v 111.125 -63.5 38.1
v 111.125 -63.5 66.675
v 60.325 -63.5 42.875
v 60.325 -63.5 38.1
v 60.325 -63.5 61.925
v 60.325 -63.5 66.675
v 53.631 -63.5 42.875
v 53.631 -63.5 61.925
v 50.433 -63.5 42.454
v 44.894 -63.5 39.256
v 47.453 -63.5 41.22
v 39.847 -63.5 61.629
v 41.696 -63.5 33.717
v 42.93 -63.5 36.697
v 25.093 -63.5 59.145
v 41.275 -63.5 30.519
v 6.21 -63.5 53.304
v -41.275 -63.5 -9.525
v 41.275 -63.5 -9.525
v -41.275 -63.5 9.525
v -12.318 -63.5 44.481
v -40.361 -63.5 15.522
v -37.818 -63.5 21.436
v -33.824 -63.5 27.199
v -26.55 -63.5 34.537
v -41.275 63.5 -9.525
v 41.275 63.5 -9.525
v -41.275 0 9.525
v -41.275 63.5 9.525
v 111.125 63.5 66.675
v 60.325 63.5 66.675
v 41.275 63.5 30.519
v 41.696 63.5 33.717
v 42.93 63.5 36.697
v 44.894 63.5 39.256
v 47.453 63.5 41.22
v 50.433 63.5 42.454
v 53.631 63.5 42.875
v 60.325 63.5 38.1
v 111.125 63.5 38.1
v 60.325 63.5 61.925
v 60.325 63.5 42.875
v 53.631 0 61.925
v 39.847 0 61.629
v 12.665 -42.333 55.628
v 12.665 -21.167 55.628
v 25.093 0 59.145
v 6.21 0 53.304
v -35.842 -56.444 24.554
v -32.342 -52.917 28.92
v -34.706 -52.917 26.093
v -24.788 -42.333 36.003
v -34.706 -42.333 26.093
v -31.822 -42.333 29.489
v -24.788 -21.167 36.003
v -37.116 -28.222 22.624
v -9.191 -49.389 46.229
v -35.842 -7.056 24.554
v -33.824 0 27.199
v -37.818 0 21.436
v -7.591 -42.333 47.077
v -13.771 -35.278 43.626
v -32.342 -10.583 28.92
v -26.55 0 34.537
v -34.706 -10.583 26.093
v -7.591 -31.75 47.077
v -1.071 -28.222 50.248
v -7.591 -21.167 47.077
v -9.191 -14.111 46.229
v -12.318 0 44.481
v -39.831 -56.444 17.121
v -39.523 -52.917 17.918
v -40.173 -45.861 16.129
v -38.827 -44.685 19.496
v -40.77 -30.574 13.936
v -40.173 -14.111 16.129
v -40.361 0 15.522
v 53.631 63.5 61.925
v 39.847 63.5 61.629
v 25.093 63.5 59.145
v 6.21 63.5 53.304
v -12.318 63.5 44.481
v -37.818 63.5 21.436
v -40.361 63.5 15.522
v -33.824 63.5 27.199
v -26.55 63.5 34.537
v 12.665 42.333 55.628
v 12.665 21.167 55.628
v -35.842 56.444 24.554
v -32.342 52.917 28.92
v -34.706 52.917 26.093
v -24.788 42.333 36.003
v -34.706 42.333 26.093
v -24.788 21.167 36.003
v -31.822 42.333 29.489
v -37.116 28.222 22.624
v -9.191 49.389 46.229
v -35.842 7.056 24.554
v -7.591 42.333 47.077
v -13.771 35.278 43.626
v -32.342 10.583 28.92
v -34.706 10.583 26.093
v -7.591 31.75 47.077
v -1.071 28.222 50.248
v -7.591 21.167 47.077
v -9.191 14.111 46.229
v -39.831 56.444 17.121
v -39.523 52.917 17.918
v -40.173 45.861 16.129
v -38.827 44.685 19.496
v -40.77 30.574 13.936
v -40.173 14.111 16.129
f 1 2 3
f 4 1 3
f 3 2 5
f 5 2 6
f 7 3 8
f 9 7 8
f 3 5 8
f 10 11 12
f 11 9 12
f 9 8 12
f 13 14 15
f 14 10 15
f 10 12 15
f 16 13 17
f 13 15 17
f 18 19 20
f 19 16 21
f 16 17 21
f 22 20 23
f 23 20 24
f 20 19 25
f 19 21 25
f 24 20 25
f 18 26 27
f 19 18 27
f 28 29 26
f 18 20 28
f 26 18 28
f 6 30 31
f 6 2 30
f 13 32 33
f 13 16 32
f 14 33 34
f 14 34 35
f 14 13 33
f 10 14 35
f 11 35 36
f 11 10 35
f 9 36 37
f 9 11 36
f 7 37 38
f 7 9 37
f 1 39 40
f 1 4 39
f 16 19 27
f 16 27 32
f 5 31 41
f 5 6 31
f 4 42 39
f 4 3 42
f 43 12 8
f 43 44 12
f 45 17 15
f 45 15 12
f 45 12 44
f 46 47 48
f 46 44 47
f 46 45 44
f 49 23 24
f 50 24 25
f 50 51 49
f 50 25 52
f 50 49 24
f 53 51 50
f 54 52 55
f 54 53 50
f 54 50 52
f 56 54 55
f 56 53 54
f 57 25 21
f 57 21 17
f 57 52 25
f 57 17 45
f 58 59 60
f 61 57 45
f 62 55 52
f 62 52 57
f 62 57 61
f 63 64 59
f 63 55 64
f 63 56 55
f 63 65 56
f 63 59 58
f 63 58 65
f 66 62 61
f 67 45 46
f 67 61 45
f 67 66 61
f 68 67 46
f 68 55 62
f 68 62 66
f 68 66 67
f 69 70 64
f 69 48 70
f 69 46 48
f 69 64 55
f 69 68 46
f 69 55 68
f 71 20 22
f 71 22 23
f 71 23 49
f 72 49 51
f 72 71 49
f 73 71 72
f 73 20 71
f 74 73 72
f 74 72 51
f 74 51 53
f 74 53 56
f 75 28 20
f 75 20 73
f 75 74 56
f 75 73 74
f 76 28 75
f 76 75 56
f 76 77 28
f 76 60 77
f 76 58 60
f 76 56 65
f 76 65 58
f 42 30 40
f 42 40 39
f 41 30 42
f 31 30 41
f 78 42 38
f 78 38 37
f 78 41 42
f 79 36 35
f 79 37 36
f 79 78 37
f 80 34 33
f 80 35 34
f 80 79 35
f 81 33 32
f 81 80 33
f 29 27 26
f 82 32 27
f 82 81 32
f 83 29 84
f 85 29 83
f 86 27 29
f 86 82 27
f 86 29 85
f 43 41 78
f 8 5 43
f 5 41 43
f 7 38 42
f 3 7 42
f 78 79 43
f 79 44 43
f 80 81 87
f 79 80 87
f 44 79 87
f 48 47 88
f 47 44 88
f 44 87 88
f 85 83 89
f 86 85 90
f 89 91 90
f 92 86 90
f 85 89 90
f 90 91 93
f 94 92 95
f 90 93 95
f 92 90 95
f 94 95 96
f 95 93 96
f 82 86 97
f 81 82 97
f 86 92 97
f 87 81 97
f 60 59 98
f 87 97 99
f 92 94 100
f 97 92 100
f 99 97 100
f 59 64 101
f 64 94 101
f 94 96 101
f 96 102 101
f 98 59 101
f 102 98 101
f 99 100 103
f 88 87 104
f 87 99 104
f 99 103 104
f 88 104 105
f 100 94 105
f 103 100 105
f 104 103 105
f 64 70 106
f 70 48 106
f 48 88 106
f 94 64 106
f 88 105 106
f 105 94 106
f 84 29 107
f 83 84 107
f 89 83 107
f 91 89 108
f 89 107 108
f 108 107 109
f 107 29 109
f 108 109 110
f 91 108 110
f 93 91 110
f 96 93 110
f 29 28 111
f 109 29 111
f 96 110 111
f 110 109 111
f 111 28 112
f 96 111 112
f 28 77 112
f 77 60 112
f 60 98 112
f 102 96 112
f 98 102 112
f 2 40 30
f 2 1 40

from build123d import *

# Parameters (mm, degrees)
F0_W     = 25.4
F0_H     = 28.575
F1_DEPTH = 63.5


with BuildPart() as f1:
    # F0 (on Front) → F1 (new body, symmetric)
    with BuildSketch(Plane.XZ):
        with BuildLine():
            add(Edge.make_bspline(
                [(-41.275, 9.525), (-41.089289, 37.270412), (16.726991, 64.451575), (53.630861, 61.9252)],
                knots=[0, 0, 0, 0, 108.410809, 108.410809, 108.410809, 108.410809], degree=3))
            Line((-41.275, 9.525), (22.225, 9.525))
            Line((22.225, 9.525), (22.225, 30.519339))
            ThreePointArc((22.225, 30.519339), (31.423564, 52.726636), (53.630861, 61.9252))
        make_face()
        Polygon((22.225, 9.525), (-41.275, 9.525), (-41.275, -9.525), (41.275, -9.525), (41.275, 9.525), align=None)
        with BuildLine():
            Line((22.225, 30.519339), (22.225, 9.525))
            Line((22.225, 9.525), (41.275, 9.525))
            Line((41.275, 9.525), (41.275, 30.519339))
            ThreePointArc((41.275, 30.519339), (44.893948, 39.256252), (53.630861, 42.8752))
            Line((53.630861, 42.8752), (60.325, 42.8752))
            Line((60.325, 42.8752), (60.325, 61.9252))
            Line((60.325, 61.9252), (53.630861, 61.9252))
            ThreePointArc((53.630861, 61.9252), (31.423564, 52.726636), (22.225, 30.519339))
        make_face()
        Polygon((60.325, 66.675), (60.325, 61.9252), (60.325, 42.8752), (60.325, 38.1), (85.725, 38.1), (85.725, 66.675), align=None)
        with Locations((98.425, 52.3875)):
            Rectangle(F0_W, F0_H)
    extrude(amount=F1_DEPTH, both=True)


solid = f1.part
